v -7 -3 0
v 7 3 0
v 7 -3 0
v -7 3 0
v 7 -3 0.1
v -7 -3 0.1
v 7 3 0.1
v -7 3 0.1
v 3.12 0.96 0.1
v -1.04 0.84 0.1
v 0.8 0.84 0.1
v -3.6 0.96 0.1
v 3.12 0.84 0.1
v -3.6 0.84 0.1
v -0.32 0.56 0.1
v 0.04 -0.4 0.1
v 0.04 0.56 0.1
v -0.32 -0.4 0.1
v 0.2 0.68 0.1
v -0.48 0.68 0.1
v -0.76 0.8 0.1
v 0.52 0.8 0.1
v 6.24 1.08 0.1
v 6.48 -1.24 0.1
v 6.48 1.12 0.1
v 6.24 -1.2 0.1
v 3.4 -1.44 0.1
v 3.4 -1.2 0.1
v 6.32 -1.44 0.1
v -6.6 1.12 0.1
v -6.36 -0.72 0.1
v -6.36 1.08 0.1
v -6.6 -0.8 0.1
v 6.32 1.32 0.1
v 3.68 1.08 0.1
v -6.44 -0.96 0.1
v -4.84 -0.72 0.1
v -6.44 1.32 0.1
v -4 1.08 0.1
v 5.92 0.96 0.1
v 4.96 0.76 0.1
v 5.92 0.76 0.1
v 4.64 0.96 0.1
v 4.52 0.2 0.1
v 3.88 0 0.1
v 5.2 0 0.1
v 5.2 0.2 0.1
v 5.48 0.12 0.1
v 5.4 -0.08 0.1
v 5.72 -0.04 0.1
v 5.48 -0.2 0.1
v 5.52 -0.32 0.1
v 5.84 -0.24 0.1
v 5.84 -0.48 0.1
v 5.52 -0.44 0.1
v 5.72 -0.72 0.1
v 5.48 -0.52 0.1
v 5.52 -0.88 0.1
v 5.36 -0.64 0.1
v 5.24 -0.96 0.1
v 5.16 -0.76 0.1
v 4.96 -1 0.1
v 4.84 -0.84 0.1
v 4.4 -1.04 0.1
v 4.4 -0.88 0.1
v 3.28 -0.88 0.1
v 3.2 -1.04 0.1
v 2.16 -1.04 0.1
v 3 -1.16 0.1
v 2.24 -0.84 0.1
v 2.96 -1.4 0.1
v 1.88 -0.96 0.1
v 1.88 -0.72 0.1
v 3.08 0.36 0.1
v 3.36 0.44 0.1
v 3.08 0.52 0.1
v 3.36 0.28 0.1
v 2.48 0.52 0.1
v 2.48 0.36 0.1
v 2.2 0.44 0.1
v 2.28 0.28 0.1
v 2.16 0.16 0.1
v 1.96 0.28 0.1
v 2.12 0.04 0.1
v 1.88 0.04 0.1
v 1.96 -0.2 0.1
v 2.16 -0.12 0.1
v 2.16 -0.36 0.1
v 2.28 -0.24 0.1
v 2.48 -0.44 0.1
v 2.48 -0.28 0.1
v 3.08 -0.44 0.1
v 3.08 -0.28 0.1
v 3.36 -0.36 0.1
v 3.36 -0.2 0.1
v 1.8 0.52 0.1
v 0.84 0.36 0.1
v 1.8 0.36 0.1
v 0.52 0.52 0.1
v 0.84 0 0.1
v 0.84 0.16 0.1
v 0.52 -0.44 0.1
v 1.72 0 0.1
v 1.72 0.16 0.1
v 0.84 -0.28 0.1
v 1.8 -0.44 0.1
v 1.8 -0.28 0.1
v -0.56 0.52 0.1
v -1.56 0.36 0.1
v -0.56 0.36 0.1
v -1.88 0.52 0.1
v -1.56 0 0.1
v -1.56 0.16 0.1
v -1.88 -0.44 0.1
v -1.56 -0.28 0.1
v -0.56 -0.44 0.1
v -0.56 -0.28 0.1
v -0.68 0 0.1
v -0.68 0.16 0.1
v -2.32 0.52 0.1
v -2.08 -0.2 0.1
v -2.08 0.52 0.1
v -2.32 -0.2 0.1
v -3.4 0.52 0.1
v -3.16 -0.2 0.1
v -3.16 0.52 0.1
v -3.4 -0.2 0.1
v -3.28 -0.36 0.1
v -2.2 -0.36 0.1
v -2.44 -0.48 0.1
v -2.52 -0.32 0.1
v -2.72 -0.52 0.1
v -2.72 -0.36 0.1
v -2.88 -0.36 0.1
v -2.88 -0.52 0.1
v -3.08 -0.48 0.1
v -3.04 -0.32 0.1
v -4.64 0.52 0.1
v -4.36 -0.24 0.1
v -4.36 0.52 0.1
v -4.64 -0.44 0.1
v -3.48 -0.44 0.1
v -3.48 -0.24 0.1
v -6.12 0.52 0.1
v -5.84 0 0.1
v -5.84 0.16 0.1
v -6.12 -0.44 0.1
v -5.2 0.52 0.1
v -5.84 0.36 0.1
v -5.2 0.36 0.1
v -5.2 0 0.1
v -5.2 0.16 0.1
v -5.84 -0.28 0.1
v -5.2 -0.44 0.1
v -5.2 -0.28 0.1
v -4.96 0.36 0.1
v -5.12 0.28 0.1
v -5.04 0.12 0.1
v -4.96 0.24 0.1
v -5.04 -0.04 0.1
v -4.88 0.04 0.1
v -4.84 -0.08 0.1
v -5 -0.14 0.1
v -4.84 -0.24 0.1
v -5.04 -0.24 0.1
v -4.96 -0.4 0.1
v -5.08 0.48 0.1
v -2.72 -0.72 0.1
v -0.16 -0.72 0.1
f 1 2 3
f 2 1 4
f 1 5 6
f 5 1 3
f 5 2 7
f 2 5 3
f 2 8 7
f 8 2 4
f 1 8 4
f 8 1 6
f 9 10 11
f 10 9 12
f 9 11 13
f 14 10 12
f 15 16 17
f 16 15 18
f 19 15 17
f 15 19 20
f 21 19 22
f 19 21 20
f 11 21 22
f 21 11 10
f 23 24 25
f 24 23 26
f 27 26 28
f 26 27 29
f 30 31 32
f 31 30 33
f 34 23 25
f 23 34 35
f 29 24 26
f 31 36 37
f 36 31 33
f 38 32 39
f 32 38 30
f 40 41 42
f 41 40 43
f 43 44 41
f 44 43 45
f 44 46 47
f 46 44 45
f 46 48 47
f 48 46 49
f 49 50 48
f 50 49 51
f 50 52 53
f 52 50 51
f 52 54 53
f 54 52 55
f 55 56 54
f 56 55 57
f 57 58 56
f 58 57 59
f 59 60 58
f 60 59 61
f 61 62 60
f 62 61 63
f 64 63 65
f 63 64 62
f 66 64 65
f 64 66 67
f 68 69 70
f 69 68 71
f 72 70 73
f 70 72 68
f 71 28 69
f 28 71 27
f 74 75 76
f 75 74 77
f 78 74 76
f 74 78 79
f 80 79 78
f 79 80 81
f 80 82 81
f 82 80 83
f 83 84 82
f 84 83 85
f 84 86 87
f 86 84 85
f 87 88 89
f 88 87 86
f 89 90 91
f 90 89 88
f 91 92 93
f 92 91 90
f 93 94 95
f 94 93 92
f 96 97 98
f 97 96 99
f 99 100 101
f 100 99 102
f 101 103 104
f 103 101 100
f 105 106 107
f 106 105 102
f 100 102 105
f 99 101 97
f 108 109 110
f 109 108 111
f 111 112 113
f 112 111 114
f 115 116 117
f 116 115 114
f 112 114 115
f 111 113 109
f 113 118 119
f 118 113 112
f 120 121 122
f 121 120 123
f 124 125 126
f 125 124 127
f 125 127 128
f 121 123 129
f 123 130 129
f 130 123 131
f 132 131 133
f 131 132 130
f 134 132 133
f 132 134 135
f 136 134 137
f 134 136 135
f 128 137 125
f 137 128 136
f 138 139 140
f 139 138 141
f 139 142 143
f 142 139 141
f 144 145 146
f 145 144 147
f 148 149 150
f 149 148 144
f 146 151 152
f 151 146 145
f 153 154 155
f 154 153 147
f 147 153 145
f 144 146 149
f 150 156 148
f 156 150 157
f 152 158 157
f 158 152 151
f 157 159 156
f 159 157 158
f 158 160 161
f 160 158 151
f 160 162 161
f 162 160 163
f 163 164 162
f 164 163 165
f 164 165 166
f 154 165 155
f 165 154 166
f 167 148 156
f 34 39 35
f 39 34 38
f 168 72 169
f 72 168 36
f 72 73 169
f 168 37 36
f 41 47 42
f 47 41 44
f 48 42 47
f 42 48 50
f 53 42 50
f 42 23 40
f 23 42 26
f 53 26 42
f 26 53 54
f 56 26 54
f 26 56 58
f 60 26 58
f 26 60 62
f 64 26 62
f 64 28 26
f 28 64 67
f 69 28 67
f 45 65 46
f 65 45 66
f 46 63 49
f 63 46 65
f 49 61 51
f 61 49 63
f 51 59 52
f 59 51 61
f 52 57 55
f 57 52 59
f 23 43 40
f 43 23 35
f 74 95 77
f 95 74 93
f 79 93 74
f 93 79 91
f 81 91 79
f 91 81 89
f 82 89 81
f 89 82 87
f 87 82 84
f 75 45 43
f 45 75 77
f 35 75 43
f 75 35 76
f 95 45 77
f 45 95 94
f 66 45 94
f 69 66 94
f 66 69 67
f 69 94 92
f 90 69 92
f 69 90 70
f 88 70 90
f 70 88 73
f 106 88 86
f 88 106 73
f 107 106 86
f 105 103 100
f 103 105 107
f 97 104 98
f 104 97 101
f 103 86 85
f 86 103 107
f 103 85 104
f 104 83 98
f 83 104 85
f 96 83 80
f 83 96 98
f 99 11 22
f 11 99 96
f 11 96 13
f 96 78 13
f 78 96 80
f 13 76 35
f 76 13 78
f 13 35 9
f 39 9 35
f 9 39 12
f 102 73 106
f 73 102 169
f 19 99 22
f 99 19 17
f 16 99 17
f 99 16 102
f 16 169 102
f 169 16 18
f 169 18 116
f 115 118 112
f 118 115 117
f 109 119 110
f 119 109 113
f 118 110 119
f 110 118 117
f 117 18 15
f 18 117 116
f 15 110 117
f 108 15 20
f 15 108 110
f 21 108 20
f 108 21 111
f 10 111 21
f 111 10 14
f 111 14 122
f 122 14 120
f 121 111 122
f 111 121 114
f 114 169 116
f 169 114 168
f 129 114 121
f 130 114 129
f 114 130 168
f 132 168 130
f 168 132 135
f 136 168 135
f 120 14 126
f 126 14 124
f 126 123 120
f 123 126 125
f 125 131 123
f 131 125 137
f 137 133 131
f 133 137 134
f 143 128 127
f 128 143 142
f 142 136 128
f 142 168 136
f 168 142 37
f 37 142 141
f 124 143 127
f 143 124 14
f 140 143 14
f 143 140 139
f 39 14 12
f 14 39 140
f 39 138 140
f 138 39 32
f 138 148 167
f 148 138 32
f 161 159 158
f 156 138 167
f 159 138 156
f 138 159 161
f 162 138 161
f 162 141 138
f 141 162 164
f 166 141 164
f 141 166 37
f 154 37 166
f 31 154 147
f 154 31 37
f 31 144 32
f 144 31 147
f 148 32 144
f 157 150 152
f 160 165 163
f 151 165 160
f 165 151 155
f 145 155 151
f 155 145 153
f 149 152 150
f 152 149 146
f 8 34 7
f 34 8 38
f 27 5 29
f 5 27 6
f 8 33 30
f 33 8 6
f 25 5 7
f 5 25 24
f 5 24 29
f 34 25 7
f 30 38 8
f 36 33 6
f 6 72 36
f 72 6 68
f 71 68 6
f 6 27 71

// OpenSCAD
// file: ../p/box5-12.scad
use <../lib.scad>
function ldraw_lib__box5_12() = [
// 0 Box with 5 Faces without Any Edges
// 0 Name: box5-12.dat
// 0 Author: Chris Dee [cwdee]
// 0 !LDRAW_ORG Primitive UPDATE 2009-02
// 0 !LICENSE Licensed under CC BY 4.0 : see CAreadme.txt
// 
// 0 BFC CERTIFY CCW
  [0,"BFC","CERTIFY"],
  [0,"BFC","CCW"],
// 
// 0 !HISTORY 2009-09-03 [PTadmin] Official Update 2009-02
// 
// 
// 4 16 1 1 1 1 1 -1 -1 1 -1 -1 1 1
  [4,16,1,1,1,1,1,-1,-1,1,-1,-1,1,1],
// 4 16 -1 0 1 1 0 1 1 1 1 -1 1 1
  [4,16,-1,0,1,1,0,1,1,1,1,-1,1,1],
// 4 16 -1 0 -1 -1 0 1 -1 1 1 -1 1 -1
  [4,16,-1,0,-1,-1,0,1,-1,1,1,-1,1,-1],
// 4 16 1 0 -1 -1 0 -1 -1 1 -1 1 1 -1
  [4,16,1,0,-1,-1,0,-1,-1,1,-1,1,1,-1],
// 4 16 1 0 1 1 0 -1 1 1 -1 1 1 1
  [4,16,1,0,1,1,0,-1,1,1,-1,1,1,1],
// 0
];
module ldraw_lib__box5_12(step=0, col=false, unit=2/5, alt=false, line=0.2, solid=!$preview)
    makepoly(ldraw_lib__box5_12(), step=step, col=col, unit=unit, alt=alt, line=line, solid=solid);
ldraw_lib__box5_12(line=0.2);
// main file
use <../lib.scad>
use <../p/box5-12.scad>
function ldraw_lib__4622303q() = [
// 0 Sticker  0.75 x  1.75 Badge "BLUETEC 5" on Orange
// 0 Name: 4622303q.dat
// 0 Author: J.C. Tchang [tchang]
// 0 !LDRAW_ORG Part UPDATE 2012-02
// 0 !LICENSE Licensed under CC BY 4.0 : see CAreadme.txt
// 
// 0 BFC CERTIFY CCW
  [0,"BFC","CERTIFY"],
  [0,"BFC","CCW"],
// 
// 0 !KEYWORDS set 8110, Unimog
// 
// 0 !HISTORY 2012-08-09 [PTadmin] Official Update 2012-02
// 
// 
// 1 16 0 -0.25 0 -17.5 0 0 0 0.25 0 0 0 -7.5 box5-12.dat
  [1,16,0,-0.25,0,-17.5,0,0,0,0.25,0,0,0,-7.5, ldraw_lib__box5_12()],
// 0 //
// 4 1 7.8 -0.25 2.4 -9 -0.25 2.4 -2.6 -0.25 2.1 2 -0.25 2.1
  [4,1,7.8,-0.25,2.4,-9,-0.25,2.4,-2.6,-0.25,2.1,2,-0.25,2.1],
// 3 1 7.8 -0.25 2.4 2 -0.25 2.1 7.8 -0.25 2.1
  [3,1,7.8,-0.25,2.4,2,-0.25,2.1,7.8,-0.25,2.1],
// 3 1 -9 -0.25 2.1 -2.6 -0.25 2.1 -9 -0.25 2.4
  [3,1,-9,-0.25,2.1,-2.6,-0.25,2.1,-9,-0.25,2.4],
// 4 1 -0.8 -0.25 -1 0.1 -0.25 -1 0.1 -0.25 1.4 -0.8 -0.25 1.4
  [4,1,-0.8,-0.25,-1,0.1,-0.25,-1,0.1,-0.25,1.4,-0.8,-0.25,1.4],
// 4 1 -1.2 -0.25 1.7 -0.8 -0.25 1.4 0.1 -0.25 1.4 0.5 -0.25 1.7
  [4,1,-1.2,-0.25,1.7,-0.8,-0.25,1.4,0.1,-0.25,1.4,0.5,-0.25,1.7],
// 4 1 0.5 -0.25 1.7 1.3 -0.25 2 -1.9 -0.25 2 -1.2 -0.25 1.7
  [4,1,0.5,-0.25,1.7,1.3,-0.25,2,-1.9,-0.25,2,-1.2,-0.25,1.7],
// 4 1 2 -0.25 2.1 -2.6 -0.25 2.1 -1.9 -0.25 2 1.3 -0.25 2
  [4,1,2,-0.25,2.1,-2.6,-0.25,2.1,-1.9,-0.25,2,1.3,-0.25,2],
// 0 //
// 4 0 15.6 -0.25 2.7 15.6 -0.25 -3 16.2 -0.25 -3.1 16.2 -0.25 2.8
  [4,0,15.6,-0.25,2.7,15.6,-0.25,-3,16.2,-0.25,-3.1,16.2,-0.25,2.8],
// 4 0 15.6 -0.25 -3 8.5 -0.25 -3 8.5 -0.25 -3.6 15.8 -0.25 -3.6
  [4,0,15.6,-0.25,-3,8.5,-0.25,-3,8.5,-0.25,-3.6,15.8,-0.25,-3.6],
// 4 0 -16.5 -0.25 -2 -15.9 -0.25 -1.8 -15.9 -0.25 2.7 -16.5 -0.25 2.8
  [4,0,-16.5,-0.25,-2,-15.9,-0.25,-1.8,-15.9,-0.25,2.7,-16.5,-0.25,2.8],
// 4 0 15.6 -0.25 2.7 16.2 -0.25 2.8 15.8 -0.25 3.3 9.2 -0.25 2.7
  [4,0,15.6,-0.25,2.7,16.2,-0.25,2.8,15.8,-0.25,3.3,9.2,-0.25,2.7],
// 3 0 15.8 -0.25 -3.6 16.2 -0.25 -3.1 15.6 -0.25 -3
  [3,0,15.8,-0.25,-3.6,16.2,-0.25,-3.1,15.6,-0.25,-3],
// 4 0 -15.9 -0.25 -1.8 -16.5 -0.25 -2 -16.1 -0.25 -2.4 -12.1 -0.25 -1.8
  [4,0,-15.9,-0.25,-1.8,-16.5,-0.25,-2,-16.1,-0.25,-2.4,-12.1,-0.25,-1.8],
// 4 0 -16.1 -0.25 3.3 -16.5 -0.25 2.8 -15.9 -0.25 2.7 -10 -0.25 2.7
  [4,0,-16.1,-0.25,3.3,-16.5,-0.25,2.8,-15.9,-0.25,2.7,-10,-0.25,2.7],
// 4 0 12.4 -0.25 1.9 14.8 -0.25 1.9 14.8 -0.25 2.4 11.6 -0.25 2.4
  [4,0,12.4,-0.25,1.9,14.8,-0.25,1.9,14.8,-0.25,2.4,11.6,-0.25,2.4],
// 4 0 11.6 -0.25 2.4 9.7 -0.25 0 11.3 -0.25 0.5 12.4 -0.25 1.9
  [4,0,11.6,-0.25,2.4,9.7,-0.25,0,11.3,-0.25,0.5,12.4,-0.25,1.9],
// 4 0 13 -0.25 0 13 -0.25 0.5 11.3 -0.25 0.5 9.7 -0.25 0
  [4,0,13,-0.25,0,13,-0.25,0.5,11.3,-0.25,0.5,9.7,-0.25,0],
// 4 0 13.7 -0.25 0.3 13 -0.25 0.5 13 -0.25 0 13.5 -0.25 -0.2
  [4,0,13.7,-0.25,0.3,13,-0.25,0.5,13,-0.25,0,13.5,-0.25,-0.2],
// 4 0 13.7 -0.25 -0.5 14.3 -0.25 -0.1 13.7 -0.25 0.3 13.5 -0.25 -0.2
  [4,0,13.7,-0.25,-0.5,14.3,-0.25,-0.1,13.7,-0.25,0.3,13.5,-0.25,-0.2],
// 4 0 13.8 -0.25 -0.8 14.6 -0.25 -0.6 14.3 -0.25 -0.1 13.7 -0.25 -0.5
  [4,0,13.8,-0.25,-0.8,14.6,-0.25,-0.6,14.3,-0.25,-0.1,13.7,-0.25,-0.5],
// 4 0 13.8 -0.25 -1.1 14.6 -0.25 -1.2 14.6 -0.25 -0.6 13.8 -0.25 -0.8
  [4,0,13.8,-0.25,-1.1,14.6,-0.25,-1.2,14.6,-0.25,-0.6,13.8,-0.25,-0.8],
// 4 0 13.7 -0.25 -1.3 14.3 -0.25 -1.8 14.6 -0.25 -1.2 13.8 -0.25 -1.1
  [4,0,13.7,-0.25,-1.3,14.3,-0.25,-1.8,14.6,-0.25,-1.2,13.8,-0.25,-1.1],
// 4 0 13.4 -0.25 -1.6 13.8 -0.25 -2.2 14.3 -0.25 -1.8 13.7 -0.25 -1.3
  [4,0,13.4,-0.25,-1.6,13.8,-0.25,-2.2,14.3,-0.25,-1.8,13.7,-0.25,-1.3],
// 4 0 13.4 -0.25 -1.6 12.9 -0.25 -1.9 13.1 -0.25 -2.4 13.8 -0.25 -2.2
  [4,0,13.4,-0.25,-1.6,12.9,-0.25,-1.9,13.1,-0.25,-2.4,13.8,-0.25,-2.2],
// 4 0 12.9 -0.25 -1.9 12.1 -0.25 -2.1 12.4 -0.25 -2.5 13.1 -0.25 -2.4
  [4,0,12.9,-0.25,-1.9,12.1,-0.25,-2.1,12.4,-0.25,-2.5,13.1,-0.25,-2.4],
// 4 0 12.1 -0.25 -2.1 11 -0.25 -2.2 11 -0.25 -2.6 12.4 -0.25 -2.5
  [4,0,12.1,-0.25,-2.1,11,-0.25,-2.2,11,-0.25,-2.6,12.4,-0.25,-2.5],
// 4 0 11 -0.25 -2.2 8.2 -0.25 -2.2 8 -0.25 -2.6 11 -0.25 -2.6
  [4,0,11,-0.25,-2.2,8.2,-0.25,-2.2,8,-0.25,-2.6,11,-0.25,-2.6],
// 4 0 7.4 -0.25 -3.5 7.5 -0.25 -2.9 5.6 -0.25 -2.1 5.4 -0.25 -2.6
  [4,0,7.4,-0.25,-3.5,7.5,-0.25,-2.9,5.6,-0.25,-2.1,5.4,-0.25,-2.6],
// 4 0 4.7 -0.25 -1.8 4.7 -0.25 -2.4 5.4 -0.25 -2.6 5.6 -0.25 -2.1
  [4,0,4.7,-0.25,-1.8,4.7,-0.25,-2.4,5.4,-0.25,-2.6,5.6,-0.25,-2.1],
// 4 0 8.5 -0.25 -3.6 8.5 -0.25 -3 7.5 -0.25 -2.9 7.4 -0.25 -3.5
  [4,0,8.5,-0.25,-3.6,8.5,-0.25,-3,7.5,-0.25,-2.9,7.4,-0.25,-3.5],
// 4 0 8.4 -0.25 0.7 8.4 -0.25 1.1 7.7 -0.25 1.3 7.7 -0.25 0.9
  [4,0,8.4,-0.25,0.7,8.4,-0.25,1.1,7.7,-0.25,1.3,7.7,-0.25,0.9],
// 4 0 7.7 -0.25 1.3 6.2 -0.25 1.3 6.2 -0.25 0.9 7.7 -0.25 0.9
  [4,0,7.7,-0.25,1.3,6.2,-0.25,1.3,6.2,-0.25,0.9,7.7,-0.25,0.9],
// 4 0 6.2 -0.25 1.3 5.5 -0.25 1.1 5.7 -0.25 0.7 6.2 -0.25 0.9
  [4,0,6.2,-0.25,1.3,5.5,-0.25,1.1,5.7,-0.25,0.7,6.2,-0.25,0.9],
// 4 0 5.5 -0.25 1.1 4.9 -0.25 0.7 5.4 -0.25 0.4 5.7 -0.25 0.7
  [4,0,5.5,-0.25,1.1,4.9,-0.25,0.7,5.4,-0.25,0.4,5.7,-0.25,0.7],
// 4 0 4.7 -0.25 0.1 5.3 -0.25 0.1 5.4 -0.25 0.4 4.9 -0.25 0.7
  [4,0,4.7,-0.25,0.1,5.3,-0.25,0.1,5.4,-0.25,0.4,4.9,-0.25,0.7],
// 4 0 4.7 -0.25 0.1 4.9 -0.25 -0.5 5.4 -0.25 -0.3 5.3 -0.25 0.1
  [4,0,4.7,-0.25,0.1,4.9,-0.25,-0.5,5.4,-0.25,-0.3,5.3,-0.25,0.1],
// 4 0 5.4 -0.25 -0.9 5.7 -0.25 -0.6 5.4 -0.25 -0.3 4.9 -0.25 -0.5
  [4,0,5.4,-0.25,-0.9,5.7,-0.25,-0.6,5.4,-0.25,-0.3,4.9,-0.25,-0.5],
// 4 0 6.2 -0.25 -1.1 6.2 -0.25 -0.7 5.7 -0.25 -0.6 5.4 -0.25 -0.9
  [4,0,6.2,-0.25,-1.1,6.2,-0.25,-0.7,5.7,-0.25,-0.6,5.4,-0.25,-0.9],
// 4 0 7.7 -0.25 -1.1 7.7 -0.25 -0.7 6.2 -0.25 -0.7 6.2 -0.25 -1.1
  [4,0,7.7,-0.25,-1.1,7.7,-0.25,-0.7,6.2,-0.25,-0.7,6.2,-0.25,-1.1],
// 4 0 8.4 -0.25 -0.9 8.4 -0.25 -0.5 7.7 -0.25 -0.7 7.7 -0.25 -1.1
  [4,0,8.4,-0.25,-0.9,8.4,-0.25,-0.5,7.7,-0.25,-0.7,7.7,-0.25,-1.1],
// 4 0 4.5 -0.25 0.9 4.5 -0.25 1.3 1.3 -0.25 1.3 2.1 -0.25 0.9
  [4,0,4.5,-0.25,0.9,4.5,-0.25,1.3,1.3,-0.25,1.3,2.1,-0.25,0.9],
// 4 0 1.3 -0.25 1.3 1.3 -0.25 -1.1 2.1 -0.25 0 2.1 -0.25 0.4
  [4,0,1.3,-0.25,1.3,1.3,-0.25,-1.1,2.1,-0.25,0,2.1,-0.25,0.4],
// 4 0 4.3 -0.25 0 4.3 -0.25 0.4 2.1 -0.25 0.4 2.1 -0.25 0
  [4,0,4.3,-0.25,0,4.3,-0.25,0.4,2.1,-0.25,0.4,2.1,-0.25,0],
// 4 0 4.5 -0.25 -1.1 4.5 -0.25 -0.7 2.1 -0.25 -0.7 1.3 -0.25 -1.1
  [4,0,4.5,-0.25,-1.1,4.5,-0.25,-0.7,2.1,-0.25,-0.7,1.3,-0.25,-1.1],
// 3 0 2.1 -0.25 0 1.3 -0.25 -1.1 2.1 -0.25 -0.7
  [3,0,2.1,-0.25,0,1.3,-0.25,-1.1,2.1,-0.25,-0.7],
// 3 0 1.3 -0.25 1.3 2.1 -0.25 0.4 2.1 -0.25 0.9
  [3,0,1.3,-0.25,1.3,2.1,-0.25,0.4,2.1,-0.25,0.9],
// 4 0 -3.9 -0.25 0.9 -1.4 -0.25 0.9 -1.4 -0.25 1.3 -4.7 -0.25 1.3
  [4,0,-3.9,-0.25,0.9,-1.4,-0.25,0.9,-1.4,-0.25,1.3,-4.7,-0.25,1.3],
// 4 0 -3.9 -0.25 0 -3.9 -0.25 0.4 -4.7 -0.25 1.3 -4.7 -0.25 -1.1
  [4,0,-3.9,-0.25,0,-3.9,-0.25,0.4,-4.7,-0.25,1.3,-4.7,-0.25,-1.1],
// 4 0 -4.7 -0.25 -1.1 -1.4 -0.25 -1.1 -1.4 -0.25 -0.7 -3.9 -0.25 -0.7
  [4,0,-4.7,-0.25,-1.1,-1.4,-0.25,-1.1,-1.4,-0.25,-0.7,-3.9,-0.25,-0.7],
// 3 0 -3.9 -0.25 0 -4.7 -0.25 -1.1 -3.9 -0.25 -0.7
  [3,0,-3.9,-0.25,0,-4.7,-0.25,-1.1,-3.9,-0.25,-0.7],
// 3 0 -4.7 -0.25 1.3 -3.9 -0.25 0.4 -3.9 -0.25 0.9
  [3,0,-4.7,-0.25,1.3,-3.9,-0.25,0.4,-3.9,-0.25,0.9],
// 4 0 -1.7 -0.25 0 -1.7 -0.25 0.4 -3.9 -0.25 0.4 -3.9 -0.25 0
  [4,0,-1.7,-0.25,0,-1.7,-0.25,0.4,-3.9,-0.25,0.4,-3.9,-0.25,0],
// 4 0 -5.8 -0.25 -0.5 -5.2 -0.25 -0.5 -5.2 -0.25 1.3 -5.8 -0.25 1.3
  [4,0,-5.8,-0.25,-0.5,-5.2,-0.25,-0.5,-5.2,-0.25,1.3,-5.8,-0.25,1.3],
// 4 0 -7.9 -0.25 1.3 -8.5 -0.25 1.3 -8.5 -0.25 -0.5 -7.9 -0.25 -0.5
  [4,0,-7.9,-0.25,1.3,-8.5,-0.25,1.3,-8.5,-0.25,-0.5,-7.9,-0.25,-0.5],
// 3 0 -7.9 -0.25 -0.5 -8.5 -0.25 -0.5 -8.2 -0.25 -0.9
  [3,0,-7.9,-0.25,-0.5,-8.5,-0.25,-0.5,-8.2,-0.25,-0.9],
// 3 0 -5.2 -0.25 -0.5 -5.8 -0.25 -0.5 -5.5 -0.25 -0.9
  [3,0,-5.2,-0.25,-0.5,-5.8,-0.25,-0.5,-5.5,-0.25,-0.9],
// 4 0 -5.8 -0.25 -0.5 -6.3 -0.25 -0.8 -6.1 -0.25 -1.2 -5.5 -0.25 -0.9
  [4,0,-5.8,-0.25,-0.5,-6.3,-0.25,-0.8,-6.1,-0.25,-1.2,-5.5,-0.25,-0.9],
// 4 0 -6.3 -0.25 -0.8 -6.8 -0.25 -0.9 -6.8 -0.25 -1.3 -6.1 -0.25 -1.2
  [4,0,-6.3,-0.25,-0.8,-6.8,-0.25,-0.9,-6.8,-0.25,-1.3,-6.1,-0.25,-1.2],
// 4 0 -6.8 -0.25 -0.9 -7.2 -0.25 -0.9 -7.2 -0.25 -1.3 -6.8 -0.25 -1.3
  [4,0,-6.8,-0.25,-0.9,-7.2,-0.25,-0.9,-7.2,-0.25,-1.3,-6.8,-0.25,-1.3],
// 4 0 -7.2 -0.25 -0.9 -7.6 -0.25 -0.8 -7.7 -0.25 -1.2 -7.2 -0.25 -1.3
  [4,0,-7.2,-0.25,-0.9,-7.6,-0.25,-0.8,-7.7,-0.25,-1.2,-7.2,-0.25,-1.3],
// 4 0 -7.9 -0.25 -0.5 -8.2 -0.25 -0.9 -7.7 -0.25 -1.2 -7.6 -0.25 -0.8
  [4,0,-7.9,-0.25,-0.5,-8.2,-0.25,-0.9,-7.7,-0.25,-1.2,-7.6,-0.25,-0.8],
// 4 0 -10.9 -0.25 1.3 -11.6 -0.25 1.3 -11.6 -0.25 -1.1 -10.9 -0.25 -0.6
  [4,0,-10.9,-0.25,1.3,-11.6,-0.25,1.3,-11.6,-0.25,-1.1,-10.9,-0.25,-0.6],
// 4 0 -8.7 -0.25 -1.1 -8.7 -0.25 -0.6 -10.9 -0.25 -0.6 -11.6 -0.25 -1.1
  [4,0,-8.7,-0.25,-1.1,-8.7,-0.25,-0.6,-10.9,-0.25,-0.6,-11.6,-0.25,-1.1],
// 4 0 -15.3 -0.25 -1.1 -14.6 -0.25 0 -14.6 -0.25 0.4 -15.3 -0.25 1.3
  [4,0,-15.3,-0.25,-1.1,-14.6,-0.25,0,-14.6,-0.25,0.4,-15.3,-0.25,1.3],
// 4 0 -15.3 -0.25 1.3 -14.6 -0.25 0.9 -13 -0.25 0.9 -13 -0.25 1.3
  [4,0,-15.3,-0.25,1.3,-14.6,-0.25,0.9,-13,-0.25,0.9,-13,-0.25,1.3],
// 4 0 -14.6 -0.25 0.4 -14.6 -0.25 0 -13 -0.25 0 -13 -0.25 0.4
  [4,0,-14.6,-0.25,0.4,-14.6,-0.25,0,-13,-0.25,0,-13,-0.25,0.4],
// 4 0 -13 -0.25 -1.1 -13 -0.25 -0.7 -14.6 -0.25 -0.7 -15.3 -0.25 -1.1
  [4,0,-13,-0.25,-1.1,-13,-0.25,-0.7,-14.6,-0.25,-0.7,-15.3,-0.25,-1.1],
// 3 0 -15.3 -0.25 -1.1 -14.6 -0.25 -0.7 -14.6 -0.25 0
  [3,0,-15.3,-0.25,-1.1,-14.6,-0.25,-0.7,-14.6,-0.25,0],
// 3 0 -15.3 -0.25 1.3 -14.6 -0.25 0.4 -14.6 -0.25 0.9
  [3,0,-15.3,-0.25,1.3,-14.6,-0.25,0.4,-14.6,-0.25,0.9],
// 4 0 -13 -0.25 0.9 -12.8 -0.25 0.7 -12.4 -0.25 0.9 -13 -0.25 1.3
  [4,0,-13,-0.25,0.9,-12.8,-0.25,0.7,-12.4,-0.25,0.9,-13,-0.25,1.3],
// 4 0 -12.8 -0.25 0.7 -13 -0.25 0.4 -13 -0.25 0 -12.6 -0.25 0.3
  [4,0,-12.8,-0.25,0.7,-13,-0.25,0.4,-13,-0.25,0,-12.6,-0.25,0.3],
// 4 0 -12.6 -0.25 0.3 -12.4 -0.25 0.6 -12.4 -0.25 0.9 -12.8 -0.25 0.7
  [4,0,-12.6,-0.25,0.3,-12.4,-0.25,0.6,-12.4,-0.25,0.9,-12.8,-0.25,0.7],
// 4 0 -13 -0.25 0 -12.6 -0.25 -0.1 -12.2 -0.25 0.1 -12.6 -0.25 0.3
  [4,0,-13,-0.25,0,-12.6,-0.25,-0.1,-12.2,-0.25,0.1,-12.6,-0.25,0.3],
// 4 0 -12.5 -0.25 -0.35 -12.1 -0.25 -0.2 -12.2 -0.25 0.1 -12.6 -0.25 -0.1
  [4,0,-12.5,-0.25,-0.35,-12.1,-0.25,-0.2,-12.2,-0.25,0.1,-12.6,-0.25,-0.1],
// 4 0 -12.5 -0.25 -0.35 -12.6 -0.25 -0.6 -12.1 -0.25 -0.6 -12.1 -0.25 -0.2
  [4,0,-12.5,-0.25,-0.35,-12.6,-0.25,-0.6,-12.1,-0.25,-0.6,-12.1,-0.25,-0.2],
// 3 0 -12.1 -0.25 -0.6 -12.6 -0.25 -0.6 -12.4 -0.25 -1
  [3,0,-12.1,-0.25,-0.6,-12.6,-0.25,-0.6,-12.4,-0.25,-1],
// 4 0 -12.6 -0.25 -0.6 -13 -0.25 -0.7 -13 -0.25 -1.1 -12.4 -0.25 -1
  [4,0,-12.6,-0.25,-0.6,-13,-0.25,-0.7,-13,-0.25,-1.1,-12.4,-0.25,-1],
// 3 0 -12.7 -0.25 1.2 -13 -0.25 1.3 -12.4 -0.25 0.9
  [3,0,-12.7,-0.25,1.2,-13,-0.25,1.3,-12.4,-0.25,0.9],
// 4 0 -10 -0.25 2.7 9.2 -0.25 2.7 15.8 -0.25 3.3 -16.1 -0.25 3.3
  [4,0,-10,-0.25,2.7,9.2,-0.25,2.7,15.8,-0.25,3.3,-16.1,-0.25,3.3],
// 4 0 4.7 -0.25 -2.4 -0.4 -0.25 -1.8 -6.8 -0.25 -1.8 -16.1 -0.25 -2.4
  [4,0,4.7,-0.25,-2.4,-0.4,-0.25,-1.8,-6.8,-0.25,-1.8,-16.1,-0.25,-2.4],
// 3 0 4.7 -0.25 -2.4 4.7 -0.25 -1.8 -0.4 -0.25 -1.8
  [3,0,4.7,-0.25,-2.4,4.7,-0.25,-1.8,-0.4,-0.25,-1.8],
// 3 0 -6.8 -0.25 -1.8 -12.1 -0.25 -1.8 -16.1 -0.25 -2.4
  [3,0,-6.8,-0.25,-1.8,-12.1,-0.25,-1.8,-16.1,-0.25,-2.4],
// 0 //
// 4 80 14.8 -0.25 1.9 12.4 -0.25 1.9 11.3 -0.25 0.5 13 -0.25 0.5
  [4,80,14.8,-0.25,1.9,12.4,-0.25,1.9,11.3,-0.25,0.5,13,-0.25,0.5],
// 3 80 13.7 -0.25 0.3 14.8 -0.25 1.9 13 -0.25 0.5
  [3,80,13.7,-0.25,0.3,14.8,-0.25,1.9,13,-0.25,0.5],
// 3 80 14.8 -0.25 1.9 13.7 -0.25 0.3 14.3 -0.25 -0.1
  [3,80,14.8,-0.25,1.9,13.7,-0.25,0.3,14.3,-0.25,-0.1],
// 3 80 14.6 -0.25 -0.6 14.8 -0.25 1.9 14.3 -0.25 -0.1
  [3,80,14.6,-0.25,-0.6,14.8,-0.25,1.9,14.3,-0.25,-0.1],
// 4 80 15.6 -0.25 2.7 14.8 -0.25 2.4 14.8 -0.25 1.9 15.6 -0.25 -3
  [4,80,15.6,-0.25,2.7,14.8,-0.25,2.4,14.8,-0.25,1.9,15.6,-0.25,-3],
// 4 80 14.6 -0.25 -0.6 14.6 -0.25 -1.2 15.6 -0.25 -3 14.8 -0.25 1.9
  [4,80,14.6,-0.25,-0.6,14.6,-0.25,-1.2,15.6,-0.25,-3,14.8,-0.25,1.9],
// 3 80 14.3 -0.25 -1.8 15.6 -0.25 -3 14.6 -0.25 -1.2
  [3,80,14.3,-0.25,-1.8,15.6,-0.25,-3,14.6,-0.25,-1.2],
// 3 80 15.6 -0.25 -3 14.3 -0.25 -1.8 13.8 -0.25 -2.2
  [3,80,15.6,-0.25,-3,14.3,-0.25,-1.8,13.8,-0.25,-2.2],
// 3 80 13.1 -0.25 -2.4 15.6 -0.25 -3 13.8 -0.25 -2.2
  [3,80,13.1,-0.25,-2.4,15.6,-0.25,-3,13.8,-0.25,-2.2],
// 3 80 15.6 -0.25 -3 13.1 -0.25 -2.4 12.4 -0.25 -2.5
  [3,80,15.6,-0.25,-3,13.1,-0.25,-2.4,12.4,-0.25,-2.5],
// 3 80 11 -0.25 -2.6 15.6 -0.25 -3 12.4 -0.25 -2.5
  [3,80,11,-0.25,-2.6,15.6,-0.25,-3,12.4,-0.25,-2.5],
// 4 80 15.6 -0.25 -3 11 -0.25 -2.6 8 -0.25 -2.6 8.5 -0.25 -3
  [4,80,15.6,-0.25,-3,11,-0.25,-2.6,8,-0.25,-2.6,8.5,-0.25,-3],
// 3 80 7.5 -0.25 -2.9 8.5 -0.25 -3 8 -0.25 -2.6
  [3,80,7.5,-0.25,-2.9,8.5,-0.25,-3,8,-0.25,-2.6],
// 4 80 13 -0.25 0 9.7 -0.25 0 8.2 -0.25 -2.2 11 -0.25 -2.2
  [4,80,13,-0.25,0,9.7,-0.25,0,8.2,-0.25,-2.2,11,-0.25,-2.2],
// 4 80 11 -0.25 -2.2 12.1 -0.25 -2.1 13.5 -0.25 -0.2 13 -0.25 0
  [4,80,11,-0.25,-2.2,12.1,-0.25,-2.1,13.5,-0.25,-0.2,13,-0.25,0],
// 4 80 12.9 -0.25 -1.9 13.7 -0.25 -0.5 13.5 -0.25 -0.2 12.1 -0.25 -2.1
  [4,80,12.9,-0.25,-1.9,13.7,-0.25,-0.5,13.5,-0.25,-0.2,12.1,-0.25,-2.1],
// 4 80 12.9 -0.25 -1.9 13.4 -0.25 -1.6 13.8 -0.25 -0.8 13.7 -0.25 -0.5
  [4,80,12.9,-0.25,-1.9,13.4,-0.25,-1.6,13.8,-0.25,-0.8,13.7,-0.25,-0.5],
// 4 80 13.7 -0.25 -1.3 13.8 -0.25 -1.1 13.8 -0.25 -0.8 13.4 -0.25 -1.6
  [4,80,13.7,-0.25,-1.3,13.8,-0.25,-1.1,13.8,-0.25,-0.8,13.4,-0.25,-1.6],
// 4 80 11.6 -0.25 2.4 14.8 -0.25 2.4 15.6 -0.25 2.7 9.2 -0.25 2.7
  [4,80,11.6,-0.25,2.4,14.8,-0.25,2.4,15.6,-0.25,2.7,9.2,-0.25,2.7],
// 4 80 7.7 -0.25 -0.7 8.4 -0.25 -0.5 8.4 -0.25 0.7 7.7 -0.25 0.9
  [4,80,7.7,-0.25,-0.7,8.4,-0.25,-0.5,8.4,-0.25,0.7,7.7,-0.25,0.9],
// 4 80 7.7 -0.25 0.9 6.2 -0.25 0.9 6.2 -0.25 -0.7 7.7 -0.25 -0.7
  [4,80,7.7,-0.25,0.9,6.2,-0.25,0.9,6.2,-0.25,-0.7,7.7,-0.25,-0.7],
// 4 80 6.2 -0.25 0.9 5.7 -0.25 0.7 5.7 -0.25 -0.6 6.2 -0.25 -0.7
  [4,80,6.2,-0.25,0.9,5.7,-0.25,0.7,5.7,-0.25,-0.6,6.2,-0.25,-0.7],
// 4 80 5.7 -0.25 0.7 5.4 -0.25 0.4 5.4 -0.25 -0.3 5.7 -0.25 -0.6
  [4,80,5.7,-0.25,0.7,5.4,-0.25,0.4,5.4,-0.25,-0.3,5.7,-0.25,-0.6],
// 3 80 5.4 -0.25 -0.3 5.4 -0.25 0.4 5.3 -0.25 0.1
  [3,80,5.4,-0.25,-0.3,5.4,-0.25,0.4,5.3,-0.25,0.1],
// 4 80 11.6 -0.25 2.4 8.4 -0.25 1.1 8.4 -0.25 0.7 9.7 -0.25 0
  [4,80,11.6,-0.25,2.4,8.4,-0.25,1.1,8.4,-0.25,0.7,9.7,-0.25,0],
// 4 80 7.7 -0.25 1.3 8.4 -0.25 1.1 11.6 -0.25 2.4 9.2 -0.25 2.7
  [4,80,7.7,-0.25,1.3,8.4,-0.25,1.1,11.6,-0.25,2.4,9.2,-0.25,2.7],
// 3 80 8.4 -0.25 -0.5 9.7 -0.25 0 8.4 -0.25 0.7
  [3,80,8.4,-0.25,-0.5,9.7,-0.25,0,8.4,-0.25,0.7],
// 3 80 9.7 -0.25 0 8.4 -0.25 -0.5 8.4 -0.25 -0.9
  [3,80,9.7,-0.25,0,8.4,-0.25,-0.5,8.4,-0.25,-0.9],
// 3 80 8.2 -0.25 -2.2 9.7 -0.25 0 8.4 -0.25 -0.9
  [3,80,8.2,-0.25,-2.2,9.7,-0.25,0,8.4,-0.25,-0.9],
// 4 80 8 -0.25 -2.6 8.2 -0.25 -2.2 8.4 -0.25 -0.9 7.5 -0.25 -2.9
  [4,80,8,-0.25,-2.6,8.2,-0.25,-2.2,8.4,-0.25,-0.9,7.5,-0.25,-2.9],
// 3 80 7.5 -0.25 -2.9 8.4 -0.25 -0.9 7.7 -0.25 -1.1
  [3,80,7.5,-0.25,-2.9,8.4,-0.25,-0.9,7.7,-0.25,-1.1],
// 4 80 7.5 -0.25 -2.9 7.7 -0.25 -1.1 6.2 -0.25 -1.1 5.6 -0.25 -2.1
  [4,80,7.5,-0.25,-2.9,7.7,-0.25,-1.1,6.2,-0.25,-1.1,5.6,-0.25,-2.1],
// 4 80 5.6 -0.25 -2.1 6.2 -0.25 -1.1 5.4 -0.25 -0.9 4.7 -0.25 -1.8
  [4,80,5.6,-0.25,-2.1,6.2,-0.25,-1.1,5.4,-0.25,-0.9,4.7,-0.25,-1.8],
// 4 80 4.7 -0.25 -1.8 5.4 -0.25 -0.9 4.9 -0.25 -0.5 4.5 -0.25 -1.1
  [4,80,4.7,-0.25,-1.8,5.4,-0.25,-0.9,4.9,-0.25,-0.5,4.5,-0.25,-1.1],
// 3 80 4.5 -0.25 -0.7 4.5 -0.25 -1.1 4.9 -0.25 -0.5
  [3,80,4.5,-0.25,-0.7,4.5,-0.25,-1.1,4.9,-0.25,-0.5],
// 4 80 4.3 -0.25 0 2.1 -0.25 0 2.1 -0.25 -0.7 4.5 -0.25 -0.7
  [4,80,4.3,-0.25,0,2.1,-0.25,0,2.1,-0.25,-0.7,4.5,-0.25,-0.7],
// 4 80 4.5 -0.25 0.9 2.1 -0.25 0.9 2.1 -0.25 0.4 4.3 -0.25 0.4
  [4,80,4.5,-0.25,0.9,2.1,-0.25,0.9,2.1,-0.25,0.4,4.3,-0.25,0.4],
// 4 80 4.5 -0.25 -0.7 4.9 -0.25 -0.5 4.7 -0.25 0.1 4.3 -0.25 0
  [4,80,4.5,-0.25,-0.7,4.9,-0.25,-0.5,4.7,-0.25,0.1,4.3,-0.25,0],
// 3 80 4.3 -0.25 0 4.7 -0.25 0.1 4.3 -0.25 0.4
  [3,80,4.3,-0.25,0,4.7,-0.25,0.1,4.3,-0.25,0.4],
// 4 80 4.7 -0.25 0.1 4.9 -0.25 0.7 4.5 -0.25 0.9 4.3 -0.25 0.4
  [4,80,4.7,-0.25,0.1,4.9,-0.25,0.7,4.5,-0.25,0.9,4.3,-0.25,0.4],
// 4 80 4.9 -0.25 0.7 5.5 -0.25 1.1 4.5 -0.25 1.3 4.5 -0.25 0.9
  [4,80,4.9,-0.25,0.7,5.5,-0.25,1.1,4.5,-0.25,1.3,4.5,-0.25,0.9],
// 4 80 2 -0.25 2.1 1.3 -0.25 2 1.3 -0.25 1.3 4.5 -0.25 1.3
  [4,80,2,-0.25,2.1,1.3,-0.25,2,1.3,-0.25,1.3,4.5,-0.25,1.3],
// 3 80 2 -0.25 2.1 4.5 -0.25 1.3 7.8 -0.25 2.1
  [3,80,2,-0.25,2.1,4.5,-0.25,1.3,7.8,-0.25,2.1],
// 4 80 4.5 -0.25 1.3 5.5 -0.25 1.1 6.2 -0.25 1.3 7.8 -0.25 2.1
  [4,80,4.5,-0.25,1.3,5.5,-0.25,1.1,6.2,-0.25,1.3,7.8,-0.25,2.1],
// 4 80 7.8 -0.25 2.1 6.2 -0.25 1.3 7.7 -0.25 1.3 9.2 -0.25 2.7
  [4,80,7.8,-0.25,2.1,6.2,-0.25,1.3,7.7,-0.25,1.3,9.2,-0.25,2.7],
// 3 80 7.8 -0.25 2.1 9.2 -0.25 2.7 7.8 -0.25 2.4
  [3,80,7.8,-0.25,2.1,9.2,-0.25,2.7,7.8,-0.25,2.4],
// 4 80 -9 -0.25 2.4 7.8 -0.25 2.4 9.2 -0.25 2.7 -10 -0.25 2.7
  [4,80,-9,-0.25,2.4,7.8,-0.25,2.4,9.2,-0.25,2.7,-10,-0.25,2.7],
// 4 80 4.7 -0.25 -1.8 4.5 -0.25 -1.1 1.3 -0.25 -1.1 -0.4 -0.25 -1.8
  [4,80,4.7,-0.25,-1.8,4.5,-0.25,-1.1,1.3,-0.25,-1.1,-0.4,-0.25,-1.8],
// 4 80 1.3 -0.25 1.3 1.3 -0.25 2 0.5 -0.25 1.7 0.1 -0.25 1.4
  [4,80,1.3,-0.25,1.3,1.3,-0.25,2,0.5,-0.25,1.7,0.1,-0.25,1.4],
// 4 80 1.3 -0.25 1.3 0.1 -0.25 1.4 0.1 -0.25 -1 1.3 -0.25 -1.1
  [4,80,1.3,-0.25,1.3,0.1,-0.25,1.4,0.1,-0.25,-1,1.3,-0.25,-1.1],
// 4 80 -0.4 -0.25 -1.8 1.3 -0.25 -1.1 0.1 -0.25 -1 -0.8 -0.25 -1
  [4,80,-0.4,-0.25,-1.8,1.3,-0.25,-1.1,0.1,-0.25,-1,-0.8,-0.25,-1],
// 3 80 -0.4 -0.25 -1.8 -0.8 -0.25 -1 -1.4 -0.25 -1.1
  [3,80,-0.4,-0.25,-1.8,-0.8,-0.25,-1,-1.4,-0.25,-1.1],
// 4 80 -3.9 -0.25 0 -3.9 -0.25 -0.7 -1.4 -0.25 -0.7 -1.7 -0.25 0
  [4,80,-3.9,-0.25,0,-3.9,-0.25,-0.7,-1.4,-0.25,-0.7,-1.7,-0.25,0],
// 4 80 -3.9 -0.25 0.9 -3.9 -0.25 0.4 -1.7 -0.25 0.4 -1.4 -0.25 0.9
  [4,80,-3.9,-0.25,0.9,-3.9,-0.25,0.4,-1.7,-0.25,0.4,-1.4,-0.25,0.9],
// 4 80 -1.4 -0.25 0.9 -1.7 -0.25 0.4 -1.7 -0.25 0 -1.4 -0.25 -0.7
  [4,80,-1.4,-0.25,0.9,-1.7,-0.25,0.4,-1.7,-0.25,0,-1.4,-0.25,-0.7],
// 4 80 -1.4 -0.25 -0.7 -1.4 -0.25 -1.1 -0.8 -0.25 -1 -0.8 -0.25 1.4
  [4,80,-1.4,-0.25,-0.7,-1.4,-0.25,-1.1,-0.8,-0.25,-1,-0.8,-0.25,1.4],
// 3 80 -0.8 -0.25 1.4 -1.4 -0.25 0.9 -1.4 -0.25 -0.7
  [3,80,-0.8,-0.25,1.4,-1.4,-0.25,0.9,-1.4,-0.25,-0.7],
// 4 80 -1.2 -0.25 1.7 -1.4 -0.25 1.3 -1.4 -0.25 0.9 -0.8 -0.25 1.4
  [4,80,-1.2,-0.25,1.7,-1.4,-0.25,1.3,-1.4,-0.25,0.9,-0.8,-0.25,1.4],
// 4 80 -1.4 -0.25 1.3 -1.2 -0.25 1.7 -1.9 -0.25 2 -4.7 -0.25 1.3
  [4,80,-1.4,-0.25,1.3,-1.2,-0.25,1.7,-1.9,-0.25,2,-4.7,-0.25,1.3],
// 4 80 -4.7 -0.25 1.3 -1.9 -0.25 2 -2.6 -0.25 2.1 -9 -0.25 2.1
  [4,80,-4.7,-0.25,1.3,-1.9,-0.25,2,-2.6,-0.25,2.1,-9,-0.25,2.1],
// 3 80 -4.7 -0.25 1.3 -9 -0.25 2.1 -5.2 -0.25 1.3
  [3,80,-4.7,-0.25,1.3,-9,-0.25,2.1,-5.2,-0.25,1.3],
// 3 80 -5.2 -0.25 1.3 -9 -0.25 2.1 -5.8 -0.25 1.3
  [3,80,-5.2,-0.25,1.3,-9,-0.25,2.1,-5.8,-0.25,1.3],
// 4 80 -4.7 -0.25 -1.1 -4.7 -0.25 1.3 -5.2 -0.25 1.3 -5.2 -0.25 -0.5
  [4,80,-4.7,-0.25,-1.1,-4.7,-0.25,1.3,-5.2,-0.25,1.3,-5.2,-0.25,-0.5],
// 4 80 -0.4 -0.25 -1.8 -1.4 -0.25 -1.1 -4.7 -0.25 -1.1 -6.8 -0.25 -1.8
  [4,80,-0.4,-0.25,-1.8,-1.4,-0.25,-1.1,-4.7,-0.25,-1.1,-6.8,-0.25,-1.8],
// 3 80 -5.5 -0.25 -0.9 -4.7 -0.25 -1.1 -5.2 -0.25 -0.5
  [3,80,-5.5,-0.25,-0.9,-4.7,-0.25,-1.1,-5.2,-0.25,-0.5],
// 4 80 -4.7 -0.25 -1.1 -5.5 -0.25 -0.9 -6.1 -0.25 -1.2 -6.8 -0.25 -1.8
  [4,80,-4.7,-0.25,-1.1,-5.5,-0.25,-0.9,-6.1,-0.25,-1.2,-6.8,-0.25,-1.8],
// 3 80 -6.8 -0.25 -1.3 -6.8 -0.25 -1.8 -6.1 -0.25 -1.2
  [3,80,-6.8,-0.25,-1.3,-6.8,-0.25,-1.8,-6.1,-0.25,-1.2],
// 3 80 -6.8 -0.25 -1.8 -6.8 -0.25 -1.3 -7.2 -0.25 -1.3
  [3,80,-6.8,-0.25,-1.8,-6.8,-0.25,-1.3,-7.2,-0.25,-1.3],
// 3 80 -7.7 -0.25 -1.2 -6.8 -0.25 -1.8 -7.2 -0.25 -1.3
  [3,80,-7.7,-0.25,-1.2,-6.8,-0.25,-1.8,-7.2,-0.25,-1.3],
// 3 80 -5.8 -0.25 1.3 -9 -0.25 2.1 -7.9 -0.25 1.3
  [3,80,-5.8,-0.25,1.3,-9,-0.25,2.1,-7.9,-0.25,1.3],
// 3 80 -7.9 -0.25 1.3 -9 -0.25 2.1 -8.5 -0.25 1.3
  [3,80,-7.9,-0.25,1.3,-9,-0.25,2.1,-8.5,-0.25,1.3],
// 4 80 -7.9 -0.25 1.3 -7.9 -0.25 -0.5 -5.8 -0.25 -0.5 -5.8 -0.25 1.3
  [4,80,-7.9,-0.25,1.3,-7.9,-0.25,-0.5,-5.8,-0.25,-0.5,-5.8,-0.25,1.3],
// 4 80 -7.6 -0.25 -0.8 -6.3 -0.25 -0.8 -5.8 -0.25 -0.5 -7.9 -0.25 -0.5
  [4,80,-7.6,-0.25,-0.8,-6.3,-0.25,-0.8,-5.8,-0.25,-0.5,-7.9,-0.25,-0.5],
// 4 80 -7.6 -0.25 -0.8 -7.2 -0.25 -0.9 -6.8 -0.25 -0.9 -6.3 -0.25 -0.8
  [4,80,-7.6,-0.25,-0.8,-7.2,-0.25,-0.9,-6.8,-0.25,-0.9,-6.3,-0.25,-0.8],
// 4 80 -8.5 -0.25 -0.5 -8.7 -0.25 -0.6 -8.7 -0.25 -1.1 -8.2 -0.25 -0.9
  [4,80,-8.5,-0.25,-0.5,-8.7,-0.25,-0.6,-8.7,-0.25,-1.1,-8.2,-0.25,-0.9],
// 3 80 -8.7 -0.25 -1.1 -7.7 -0.25 -1.2 -8.2 -0.25 -0.9
  [3,80,-8.7,-0.25,-1.1,-7.7,-0.25,-1.2,-8.2,-0.25,-0.9],
// 4 80 -6.8 -0.25 -1.8 -7.7 -0.25 -1.2 -8.7 -0.25 -1.1 -12.1 -0.25 -1.8
  [4,80,-6.8,-0.25,-1.8,-7.7,-0.25,-1.2,-8.7,-0.25,-1.1,-12.1,-0.25,-1.8],
// 3 80 -12.1 -0.25 -1.8 -8.7 -0.25 -1.1 -11.6 -0.25 -1.1
  [3,80,-12.1,-0.25,-1.8,-8.7,-0.25,-1.1,-11.6,-0.25,-1.1],
// 4 80 -8.5 -0.25 -0.5 -8.5 -0.25 1.3 -9 -0.25 2.1 -8.7 -0.25 -0.6
  [4,80,-8.5,-0.25,-0.5,-8.5,-0.25,1.3,-9,-0.25,2.1,-8.7,-0.25,-0.6],
// 4 80 -10.9 -0.25 1.3 -10.9 -0.25 -0.6 -8.7 -0.25 -0.6 -9 -0.25 2.1
  [4,80,-10.9,-0.25,1.3,-10.9,-0.25,-0.6,-8.7,-0.25,-0.6,-9,-0.25,2.1],
// 4 80 -9 -0.25 2.1 -9 -0.25 2.4 -10 -0.25 2.7 -10.9 -0.25 1.3
  [4,80,-9,-0.25,2.1,-9,-0.25,2.4,-10,-0.25,2.7,-10.9,-0.25,1.3],
// 4 80 -15.9 -0.25 2.7 -11.6 -0.25 1.3 -10.9 -0.25 1.3 -10 -0.25 2.7
  [4,80,-15.9,-0.25,2.7,-11.6,-0.25,1.3,-10.9,-0.25,1.3,-10,-0.25,2.7],
// 4 80 -13 -0.25 1.3 -12.7 -0.25 1.2 -11.6 -0.25 1.3 -15.9 -0.25 2.7
  [4,80,-13,-0.25,1.3,-12.7,-0.25,1.2,-11.6,-0.25,1.3,-15.9,-0.25,2.7],
// 3 80 -12.2 -0.25 0.1 -12.4 -0.25 0.6 -12.6 -0.25 0.3
  [3,80,-12.2,-0.25,0.1,-12.4,-0.25,0.6,-12.6,-0.25,0.3],
// 3 80 -12.4 -0.25 0.9 -11.6 -0.25 1.3 -12.7 -0.25 1.2
  [3,80,-12.4,-0.25,0.9,-11.6,-0.25,1.3,-12.7,-0.25,1.2],
// 4 80 -11.6 -0.25 1.3 -12.4 -0.25 0.9 -12.4 -0.25 0.6 -12.2 -0.25 0.1
  [4,80,-11.6,-0.25,1.3,-12.4,-0.25,0.9,-12.4,-0.25,0.6,-12.2,-0.25,0.1],
// 3 80 -12.1 -0.25 -0.2 -11.6 -0.25 1.3 -12.2 -0.25 0.1
  [3,80,-12.1,-0.25,-0.2,-11.6,-0.25,1.3,-12.2,-0.25,0.1],
// 4 80 -11.6 -0.25 1.3 -12.1 -0.25 -0.2 -12.1 -0.25 -0.6 -11.6 -0.25 -1.1
  [4,80,-11.6,-0.25,1.3,-12.1,-0.25,-0.2,-12.1,-0.25,-0.6,-11.6,-0.25,-1.1],
// 4 80 -11.6 -0.25 -1.1 -12.1 -0.25 -0.6 -12.4 -0.25 -1 -12.1 -0.25 -1.8
  [4,80,-11.6,-0.25,-1.1,-12.1,-0.25,-0.6,-12.4,-0.25,-1,-12.1,-0.25,-1.8],
// 3 80 -13 -0.25 -1.1 -12.1 -0.25 -1.8 -12.4 -0.25 -1
  [3,80,-13,-0.25,-1.1,-12.1,-0.25,-1.8,-12.4,-0.25,-1],
// 4 80 -12.1 -0.25 -1.8 -13 -0.25 -1.1 -15.3 -0.25 -1.1 -15.9 -0.25 -1.8
  [4,80,-12.1,-0.25,-1.8,-13,-0.25,-1.1,-15.3,-0.25,-1.1,-15.9,-0.25,-1.8],
// 4 80 -15.9 -0.25 -1.8 -15.3 -0.25 -1.1 -15.3 -0.25 1.3 -15.9 -0.25 2.7
  [4,80,-15.9,-0.25,-1.8,-15.3,-0.25,-1.1,-15.3,-0.25,1.3,-15.9,-0.25,2.7],
// 3 80 -13 -0.25 1.3 -15.9 -0.25 2.7 -15.3 -0.25 1.3
  [3,80,-13,-0.25,1.3,-15.9,-0.25,2.7,-15.3,-0.25,1.3],
// 3 80 -12.8 -0.25 0.7 -13 -0.25 0.9 -13 -0.25 0.4
  [3,80,-12.8,-0.25,0.7,-13,-0.25,0.9,-13,-0.25,0.4],
// 3 80 -12.6 -0.25 -0.1 -12.6 -0.25 -0.6 -12.5 -0.25 -0.35
  [3,80,-12.6,-0.25,-0.1,-12.6,-0.25,-0.6,-12.5,-0.25,-0.35],
// 4 80 -12.6 -0.25 -0.6 -12.6 -0.25 -0.1 -13 -0.25 0 -13 -0.25 -0.7
  [4,80,-12.6,-0.25,-0.6,-12.6,-0.25,-0.1,-13,-0.25,0,-13,-0.25,-0.7],
// 4 80 -14.6 -0.25 0 -14.6 -0.25 -0.7 -13 -0.25 -0.7 -13 -0.25 0
  [4,80,-14.6,-0.25,0,-14.6,-0.25,-0.7,-13,-0.25,-0.7,-13,-0.25,0],
// 4 80 -14.6 -0.25 0.9 -14.6 -0.25 0.4 -13 -0.25 0.4 -13 -0.25 0.9
  [4,80,-14.6,-0.25,0.9,-14.6,-0.25,0.4,-13,-0.25,0.4,-13,-0.25,0.9],
// 0 //
// 4 25 -16.1 -0.25 3.3 15.8 -0.25 3.3 17.5 -0.25 7.5 -17.5 -0.25 7.5
  [4,25,-16.1,-0.25,3.3,15.8,-0.25,3.3,17.5,-0.25,7.5,-17.5,-0.25,7.5],
// 4 25 17.5 -0.25 -7.5 15.8 -0.25 -3.6 8.5 -0.25 -3.6 -17.5 -0.25 -7.5
  [4,25,17.5,-0.25,-7.5,15.8,-0.25,-3.6,8.5,-0.25,-3.6,-17.5,-0.25,-7.5],
// 4 25 -17.5 -0.25 -7.5 -16.5 -0.25 -2 -16.5 -0.25 2.8 -17.5 -0.25 7.5
  [4,25,-17.5,-0.25,-7.5,-16.5,-0.25,-2,-16.5,-0.25,2.8,-17.5,-0.25,7.5],
// 4 25 17.5 -0.25 7.5 16.2 -0.25 2.8 16.2 -0.25 -3.1 17.5 -0.25 -7.5
  [4,25,17.5,-0.25,7.5,16.2,-0.25,2.8,16.2,-0.25,-3.1,17.5,-0.25,-7.5],
// 3 25 17.5 -0.25 -7.5 16.2 -0.25 -3.1 15.8 -0.25 -3.6
  [3,25,17.5,-0.25,-7.5,16.2,-0.25,-3.1,15.8,-0.25,-3.6],
// 3 25 15.8 -0.25 3.3 16.2 -0.25 2.8 17.5 -0.25 7.5
  [3,25,15.8,-0.25,3.3,16.2,-0.25,2.8,17.5,-0.25,7.5],
// 3 25 -16.5 -0.25 2.8 -16.1 -0.25 3.3 -17.5 -0.25 7.5
  [3,25,-16.5,-0.25,2.8,-16.1,-0.25,3.3,-17.5,-0.25,7.5],
// 3 25 -16.1 -0.25 -2.4 -16.5 -0.25 -2 -17.5 -0.25 -7.5
  [3,25,-16.1,-0.25,-2.4,-16.5,-0.25,-2,-17.5,-0.25,-7.5],
// 4 25 4.7 -0.25 -2.4 -16.1 -0.25 -2.4 -17.5 -0.25 -7.5 5.4 -0.25 -2.6
  [4,25,4.7,-0.25,-2.4,-16.1,-0.25,-2.4,-17.5,-0.25,-7.5,5.4,-0.25,-2.6],
// 3 25 7.4 -0.25 -3.5 5.4 -0.25 -2.6 -17.5 -0.25 -7.5
  [3,25,7.4,-0.25,-3.5,5.4,-0.25,-2.6,-17.5,-0.25,-7.5],
// 3 25 -17.5 -0.25 -7.5 8.5 -0.25 -3.6 7.4 -0.25 -3.5
  [3,25,-17.5,-0.25,-7.5,8.5,-0.25,-3.6,7.4,-0.25,-3.5],
];
module ldraw_lib__4622303q(step=0, col=false, unit=2/5, alt=false, line=0.2, solid=!$preview)
    makepoly(ldraw_lib__4622303q(), step=step, col=col, unit=unit, alt=alt, line=line, solid=solid);
ldraw_lib__4622303q(line=0.2);
